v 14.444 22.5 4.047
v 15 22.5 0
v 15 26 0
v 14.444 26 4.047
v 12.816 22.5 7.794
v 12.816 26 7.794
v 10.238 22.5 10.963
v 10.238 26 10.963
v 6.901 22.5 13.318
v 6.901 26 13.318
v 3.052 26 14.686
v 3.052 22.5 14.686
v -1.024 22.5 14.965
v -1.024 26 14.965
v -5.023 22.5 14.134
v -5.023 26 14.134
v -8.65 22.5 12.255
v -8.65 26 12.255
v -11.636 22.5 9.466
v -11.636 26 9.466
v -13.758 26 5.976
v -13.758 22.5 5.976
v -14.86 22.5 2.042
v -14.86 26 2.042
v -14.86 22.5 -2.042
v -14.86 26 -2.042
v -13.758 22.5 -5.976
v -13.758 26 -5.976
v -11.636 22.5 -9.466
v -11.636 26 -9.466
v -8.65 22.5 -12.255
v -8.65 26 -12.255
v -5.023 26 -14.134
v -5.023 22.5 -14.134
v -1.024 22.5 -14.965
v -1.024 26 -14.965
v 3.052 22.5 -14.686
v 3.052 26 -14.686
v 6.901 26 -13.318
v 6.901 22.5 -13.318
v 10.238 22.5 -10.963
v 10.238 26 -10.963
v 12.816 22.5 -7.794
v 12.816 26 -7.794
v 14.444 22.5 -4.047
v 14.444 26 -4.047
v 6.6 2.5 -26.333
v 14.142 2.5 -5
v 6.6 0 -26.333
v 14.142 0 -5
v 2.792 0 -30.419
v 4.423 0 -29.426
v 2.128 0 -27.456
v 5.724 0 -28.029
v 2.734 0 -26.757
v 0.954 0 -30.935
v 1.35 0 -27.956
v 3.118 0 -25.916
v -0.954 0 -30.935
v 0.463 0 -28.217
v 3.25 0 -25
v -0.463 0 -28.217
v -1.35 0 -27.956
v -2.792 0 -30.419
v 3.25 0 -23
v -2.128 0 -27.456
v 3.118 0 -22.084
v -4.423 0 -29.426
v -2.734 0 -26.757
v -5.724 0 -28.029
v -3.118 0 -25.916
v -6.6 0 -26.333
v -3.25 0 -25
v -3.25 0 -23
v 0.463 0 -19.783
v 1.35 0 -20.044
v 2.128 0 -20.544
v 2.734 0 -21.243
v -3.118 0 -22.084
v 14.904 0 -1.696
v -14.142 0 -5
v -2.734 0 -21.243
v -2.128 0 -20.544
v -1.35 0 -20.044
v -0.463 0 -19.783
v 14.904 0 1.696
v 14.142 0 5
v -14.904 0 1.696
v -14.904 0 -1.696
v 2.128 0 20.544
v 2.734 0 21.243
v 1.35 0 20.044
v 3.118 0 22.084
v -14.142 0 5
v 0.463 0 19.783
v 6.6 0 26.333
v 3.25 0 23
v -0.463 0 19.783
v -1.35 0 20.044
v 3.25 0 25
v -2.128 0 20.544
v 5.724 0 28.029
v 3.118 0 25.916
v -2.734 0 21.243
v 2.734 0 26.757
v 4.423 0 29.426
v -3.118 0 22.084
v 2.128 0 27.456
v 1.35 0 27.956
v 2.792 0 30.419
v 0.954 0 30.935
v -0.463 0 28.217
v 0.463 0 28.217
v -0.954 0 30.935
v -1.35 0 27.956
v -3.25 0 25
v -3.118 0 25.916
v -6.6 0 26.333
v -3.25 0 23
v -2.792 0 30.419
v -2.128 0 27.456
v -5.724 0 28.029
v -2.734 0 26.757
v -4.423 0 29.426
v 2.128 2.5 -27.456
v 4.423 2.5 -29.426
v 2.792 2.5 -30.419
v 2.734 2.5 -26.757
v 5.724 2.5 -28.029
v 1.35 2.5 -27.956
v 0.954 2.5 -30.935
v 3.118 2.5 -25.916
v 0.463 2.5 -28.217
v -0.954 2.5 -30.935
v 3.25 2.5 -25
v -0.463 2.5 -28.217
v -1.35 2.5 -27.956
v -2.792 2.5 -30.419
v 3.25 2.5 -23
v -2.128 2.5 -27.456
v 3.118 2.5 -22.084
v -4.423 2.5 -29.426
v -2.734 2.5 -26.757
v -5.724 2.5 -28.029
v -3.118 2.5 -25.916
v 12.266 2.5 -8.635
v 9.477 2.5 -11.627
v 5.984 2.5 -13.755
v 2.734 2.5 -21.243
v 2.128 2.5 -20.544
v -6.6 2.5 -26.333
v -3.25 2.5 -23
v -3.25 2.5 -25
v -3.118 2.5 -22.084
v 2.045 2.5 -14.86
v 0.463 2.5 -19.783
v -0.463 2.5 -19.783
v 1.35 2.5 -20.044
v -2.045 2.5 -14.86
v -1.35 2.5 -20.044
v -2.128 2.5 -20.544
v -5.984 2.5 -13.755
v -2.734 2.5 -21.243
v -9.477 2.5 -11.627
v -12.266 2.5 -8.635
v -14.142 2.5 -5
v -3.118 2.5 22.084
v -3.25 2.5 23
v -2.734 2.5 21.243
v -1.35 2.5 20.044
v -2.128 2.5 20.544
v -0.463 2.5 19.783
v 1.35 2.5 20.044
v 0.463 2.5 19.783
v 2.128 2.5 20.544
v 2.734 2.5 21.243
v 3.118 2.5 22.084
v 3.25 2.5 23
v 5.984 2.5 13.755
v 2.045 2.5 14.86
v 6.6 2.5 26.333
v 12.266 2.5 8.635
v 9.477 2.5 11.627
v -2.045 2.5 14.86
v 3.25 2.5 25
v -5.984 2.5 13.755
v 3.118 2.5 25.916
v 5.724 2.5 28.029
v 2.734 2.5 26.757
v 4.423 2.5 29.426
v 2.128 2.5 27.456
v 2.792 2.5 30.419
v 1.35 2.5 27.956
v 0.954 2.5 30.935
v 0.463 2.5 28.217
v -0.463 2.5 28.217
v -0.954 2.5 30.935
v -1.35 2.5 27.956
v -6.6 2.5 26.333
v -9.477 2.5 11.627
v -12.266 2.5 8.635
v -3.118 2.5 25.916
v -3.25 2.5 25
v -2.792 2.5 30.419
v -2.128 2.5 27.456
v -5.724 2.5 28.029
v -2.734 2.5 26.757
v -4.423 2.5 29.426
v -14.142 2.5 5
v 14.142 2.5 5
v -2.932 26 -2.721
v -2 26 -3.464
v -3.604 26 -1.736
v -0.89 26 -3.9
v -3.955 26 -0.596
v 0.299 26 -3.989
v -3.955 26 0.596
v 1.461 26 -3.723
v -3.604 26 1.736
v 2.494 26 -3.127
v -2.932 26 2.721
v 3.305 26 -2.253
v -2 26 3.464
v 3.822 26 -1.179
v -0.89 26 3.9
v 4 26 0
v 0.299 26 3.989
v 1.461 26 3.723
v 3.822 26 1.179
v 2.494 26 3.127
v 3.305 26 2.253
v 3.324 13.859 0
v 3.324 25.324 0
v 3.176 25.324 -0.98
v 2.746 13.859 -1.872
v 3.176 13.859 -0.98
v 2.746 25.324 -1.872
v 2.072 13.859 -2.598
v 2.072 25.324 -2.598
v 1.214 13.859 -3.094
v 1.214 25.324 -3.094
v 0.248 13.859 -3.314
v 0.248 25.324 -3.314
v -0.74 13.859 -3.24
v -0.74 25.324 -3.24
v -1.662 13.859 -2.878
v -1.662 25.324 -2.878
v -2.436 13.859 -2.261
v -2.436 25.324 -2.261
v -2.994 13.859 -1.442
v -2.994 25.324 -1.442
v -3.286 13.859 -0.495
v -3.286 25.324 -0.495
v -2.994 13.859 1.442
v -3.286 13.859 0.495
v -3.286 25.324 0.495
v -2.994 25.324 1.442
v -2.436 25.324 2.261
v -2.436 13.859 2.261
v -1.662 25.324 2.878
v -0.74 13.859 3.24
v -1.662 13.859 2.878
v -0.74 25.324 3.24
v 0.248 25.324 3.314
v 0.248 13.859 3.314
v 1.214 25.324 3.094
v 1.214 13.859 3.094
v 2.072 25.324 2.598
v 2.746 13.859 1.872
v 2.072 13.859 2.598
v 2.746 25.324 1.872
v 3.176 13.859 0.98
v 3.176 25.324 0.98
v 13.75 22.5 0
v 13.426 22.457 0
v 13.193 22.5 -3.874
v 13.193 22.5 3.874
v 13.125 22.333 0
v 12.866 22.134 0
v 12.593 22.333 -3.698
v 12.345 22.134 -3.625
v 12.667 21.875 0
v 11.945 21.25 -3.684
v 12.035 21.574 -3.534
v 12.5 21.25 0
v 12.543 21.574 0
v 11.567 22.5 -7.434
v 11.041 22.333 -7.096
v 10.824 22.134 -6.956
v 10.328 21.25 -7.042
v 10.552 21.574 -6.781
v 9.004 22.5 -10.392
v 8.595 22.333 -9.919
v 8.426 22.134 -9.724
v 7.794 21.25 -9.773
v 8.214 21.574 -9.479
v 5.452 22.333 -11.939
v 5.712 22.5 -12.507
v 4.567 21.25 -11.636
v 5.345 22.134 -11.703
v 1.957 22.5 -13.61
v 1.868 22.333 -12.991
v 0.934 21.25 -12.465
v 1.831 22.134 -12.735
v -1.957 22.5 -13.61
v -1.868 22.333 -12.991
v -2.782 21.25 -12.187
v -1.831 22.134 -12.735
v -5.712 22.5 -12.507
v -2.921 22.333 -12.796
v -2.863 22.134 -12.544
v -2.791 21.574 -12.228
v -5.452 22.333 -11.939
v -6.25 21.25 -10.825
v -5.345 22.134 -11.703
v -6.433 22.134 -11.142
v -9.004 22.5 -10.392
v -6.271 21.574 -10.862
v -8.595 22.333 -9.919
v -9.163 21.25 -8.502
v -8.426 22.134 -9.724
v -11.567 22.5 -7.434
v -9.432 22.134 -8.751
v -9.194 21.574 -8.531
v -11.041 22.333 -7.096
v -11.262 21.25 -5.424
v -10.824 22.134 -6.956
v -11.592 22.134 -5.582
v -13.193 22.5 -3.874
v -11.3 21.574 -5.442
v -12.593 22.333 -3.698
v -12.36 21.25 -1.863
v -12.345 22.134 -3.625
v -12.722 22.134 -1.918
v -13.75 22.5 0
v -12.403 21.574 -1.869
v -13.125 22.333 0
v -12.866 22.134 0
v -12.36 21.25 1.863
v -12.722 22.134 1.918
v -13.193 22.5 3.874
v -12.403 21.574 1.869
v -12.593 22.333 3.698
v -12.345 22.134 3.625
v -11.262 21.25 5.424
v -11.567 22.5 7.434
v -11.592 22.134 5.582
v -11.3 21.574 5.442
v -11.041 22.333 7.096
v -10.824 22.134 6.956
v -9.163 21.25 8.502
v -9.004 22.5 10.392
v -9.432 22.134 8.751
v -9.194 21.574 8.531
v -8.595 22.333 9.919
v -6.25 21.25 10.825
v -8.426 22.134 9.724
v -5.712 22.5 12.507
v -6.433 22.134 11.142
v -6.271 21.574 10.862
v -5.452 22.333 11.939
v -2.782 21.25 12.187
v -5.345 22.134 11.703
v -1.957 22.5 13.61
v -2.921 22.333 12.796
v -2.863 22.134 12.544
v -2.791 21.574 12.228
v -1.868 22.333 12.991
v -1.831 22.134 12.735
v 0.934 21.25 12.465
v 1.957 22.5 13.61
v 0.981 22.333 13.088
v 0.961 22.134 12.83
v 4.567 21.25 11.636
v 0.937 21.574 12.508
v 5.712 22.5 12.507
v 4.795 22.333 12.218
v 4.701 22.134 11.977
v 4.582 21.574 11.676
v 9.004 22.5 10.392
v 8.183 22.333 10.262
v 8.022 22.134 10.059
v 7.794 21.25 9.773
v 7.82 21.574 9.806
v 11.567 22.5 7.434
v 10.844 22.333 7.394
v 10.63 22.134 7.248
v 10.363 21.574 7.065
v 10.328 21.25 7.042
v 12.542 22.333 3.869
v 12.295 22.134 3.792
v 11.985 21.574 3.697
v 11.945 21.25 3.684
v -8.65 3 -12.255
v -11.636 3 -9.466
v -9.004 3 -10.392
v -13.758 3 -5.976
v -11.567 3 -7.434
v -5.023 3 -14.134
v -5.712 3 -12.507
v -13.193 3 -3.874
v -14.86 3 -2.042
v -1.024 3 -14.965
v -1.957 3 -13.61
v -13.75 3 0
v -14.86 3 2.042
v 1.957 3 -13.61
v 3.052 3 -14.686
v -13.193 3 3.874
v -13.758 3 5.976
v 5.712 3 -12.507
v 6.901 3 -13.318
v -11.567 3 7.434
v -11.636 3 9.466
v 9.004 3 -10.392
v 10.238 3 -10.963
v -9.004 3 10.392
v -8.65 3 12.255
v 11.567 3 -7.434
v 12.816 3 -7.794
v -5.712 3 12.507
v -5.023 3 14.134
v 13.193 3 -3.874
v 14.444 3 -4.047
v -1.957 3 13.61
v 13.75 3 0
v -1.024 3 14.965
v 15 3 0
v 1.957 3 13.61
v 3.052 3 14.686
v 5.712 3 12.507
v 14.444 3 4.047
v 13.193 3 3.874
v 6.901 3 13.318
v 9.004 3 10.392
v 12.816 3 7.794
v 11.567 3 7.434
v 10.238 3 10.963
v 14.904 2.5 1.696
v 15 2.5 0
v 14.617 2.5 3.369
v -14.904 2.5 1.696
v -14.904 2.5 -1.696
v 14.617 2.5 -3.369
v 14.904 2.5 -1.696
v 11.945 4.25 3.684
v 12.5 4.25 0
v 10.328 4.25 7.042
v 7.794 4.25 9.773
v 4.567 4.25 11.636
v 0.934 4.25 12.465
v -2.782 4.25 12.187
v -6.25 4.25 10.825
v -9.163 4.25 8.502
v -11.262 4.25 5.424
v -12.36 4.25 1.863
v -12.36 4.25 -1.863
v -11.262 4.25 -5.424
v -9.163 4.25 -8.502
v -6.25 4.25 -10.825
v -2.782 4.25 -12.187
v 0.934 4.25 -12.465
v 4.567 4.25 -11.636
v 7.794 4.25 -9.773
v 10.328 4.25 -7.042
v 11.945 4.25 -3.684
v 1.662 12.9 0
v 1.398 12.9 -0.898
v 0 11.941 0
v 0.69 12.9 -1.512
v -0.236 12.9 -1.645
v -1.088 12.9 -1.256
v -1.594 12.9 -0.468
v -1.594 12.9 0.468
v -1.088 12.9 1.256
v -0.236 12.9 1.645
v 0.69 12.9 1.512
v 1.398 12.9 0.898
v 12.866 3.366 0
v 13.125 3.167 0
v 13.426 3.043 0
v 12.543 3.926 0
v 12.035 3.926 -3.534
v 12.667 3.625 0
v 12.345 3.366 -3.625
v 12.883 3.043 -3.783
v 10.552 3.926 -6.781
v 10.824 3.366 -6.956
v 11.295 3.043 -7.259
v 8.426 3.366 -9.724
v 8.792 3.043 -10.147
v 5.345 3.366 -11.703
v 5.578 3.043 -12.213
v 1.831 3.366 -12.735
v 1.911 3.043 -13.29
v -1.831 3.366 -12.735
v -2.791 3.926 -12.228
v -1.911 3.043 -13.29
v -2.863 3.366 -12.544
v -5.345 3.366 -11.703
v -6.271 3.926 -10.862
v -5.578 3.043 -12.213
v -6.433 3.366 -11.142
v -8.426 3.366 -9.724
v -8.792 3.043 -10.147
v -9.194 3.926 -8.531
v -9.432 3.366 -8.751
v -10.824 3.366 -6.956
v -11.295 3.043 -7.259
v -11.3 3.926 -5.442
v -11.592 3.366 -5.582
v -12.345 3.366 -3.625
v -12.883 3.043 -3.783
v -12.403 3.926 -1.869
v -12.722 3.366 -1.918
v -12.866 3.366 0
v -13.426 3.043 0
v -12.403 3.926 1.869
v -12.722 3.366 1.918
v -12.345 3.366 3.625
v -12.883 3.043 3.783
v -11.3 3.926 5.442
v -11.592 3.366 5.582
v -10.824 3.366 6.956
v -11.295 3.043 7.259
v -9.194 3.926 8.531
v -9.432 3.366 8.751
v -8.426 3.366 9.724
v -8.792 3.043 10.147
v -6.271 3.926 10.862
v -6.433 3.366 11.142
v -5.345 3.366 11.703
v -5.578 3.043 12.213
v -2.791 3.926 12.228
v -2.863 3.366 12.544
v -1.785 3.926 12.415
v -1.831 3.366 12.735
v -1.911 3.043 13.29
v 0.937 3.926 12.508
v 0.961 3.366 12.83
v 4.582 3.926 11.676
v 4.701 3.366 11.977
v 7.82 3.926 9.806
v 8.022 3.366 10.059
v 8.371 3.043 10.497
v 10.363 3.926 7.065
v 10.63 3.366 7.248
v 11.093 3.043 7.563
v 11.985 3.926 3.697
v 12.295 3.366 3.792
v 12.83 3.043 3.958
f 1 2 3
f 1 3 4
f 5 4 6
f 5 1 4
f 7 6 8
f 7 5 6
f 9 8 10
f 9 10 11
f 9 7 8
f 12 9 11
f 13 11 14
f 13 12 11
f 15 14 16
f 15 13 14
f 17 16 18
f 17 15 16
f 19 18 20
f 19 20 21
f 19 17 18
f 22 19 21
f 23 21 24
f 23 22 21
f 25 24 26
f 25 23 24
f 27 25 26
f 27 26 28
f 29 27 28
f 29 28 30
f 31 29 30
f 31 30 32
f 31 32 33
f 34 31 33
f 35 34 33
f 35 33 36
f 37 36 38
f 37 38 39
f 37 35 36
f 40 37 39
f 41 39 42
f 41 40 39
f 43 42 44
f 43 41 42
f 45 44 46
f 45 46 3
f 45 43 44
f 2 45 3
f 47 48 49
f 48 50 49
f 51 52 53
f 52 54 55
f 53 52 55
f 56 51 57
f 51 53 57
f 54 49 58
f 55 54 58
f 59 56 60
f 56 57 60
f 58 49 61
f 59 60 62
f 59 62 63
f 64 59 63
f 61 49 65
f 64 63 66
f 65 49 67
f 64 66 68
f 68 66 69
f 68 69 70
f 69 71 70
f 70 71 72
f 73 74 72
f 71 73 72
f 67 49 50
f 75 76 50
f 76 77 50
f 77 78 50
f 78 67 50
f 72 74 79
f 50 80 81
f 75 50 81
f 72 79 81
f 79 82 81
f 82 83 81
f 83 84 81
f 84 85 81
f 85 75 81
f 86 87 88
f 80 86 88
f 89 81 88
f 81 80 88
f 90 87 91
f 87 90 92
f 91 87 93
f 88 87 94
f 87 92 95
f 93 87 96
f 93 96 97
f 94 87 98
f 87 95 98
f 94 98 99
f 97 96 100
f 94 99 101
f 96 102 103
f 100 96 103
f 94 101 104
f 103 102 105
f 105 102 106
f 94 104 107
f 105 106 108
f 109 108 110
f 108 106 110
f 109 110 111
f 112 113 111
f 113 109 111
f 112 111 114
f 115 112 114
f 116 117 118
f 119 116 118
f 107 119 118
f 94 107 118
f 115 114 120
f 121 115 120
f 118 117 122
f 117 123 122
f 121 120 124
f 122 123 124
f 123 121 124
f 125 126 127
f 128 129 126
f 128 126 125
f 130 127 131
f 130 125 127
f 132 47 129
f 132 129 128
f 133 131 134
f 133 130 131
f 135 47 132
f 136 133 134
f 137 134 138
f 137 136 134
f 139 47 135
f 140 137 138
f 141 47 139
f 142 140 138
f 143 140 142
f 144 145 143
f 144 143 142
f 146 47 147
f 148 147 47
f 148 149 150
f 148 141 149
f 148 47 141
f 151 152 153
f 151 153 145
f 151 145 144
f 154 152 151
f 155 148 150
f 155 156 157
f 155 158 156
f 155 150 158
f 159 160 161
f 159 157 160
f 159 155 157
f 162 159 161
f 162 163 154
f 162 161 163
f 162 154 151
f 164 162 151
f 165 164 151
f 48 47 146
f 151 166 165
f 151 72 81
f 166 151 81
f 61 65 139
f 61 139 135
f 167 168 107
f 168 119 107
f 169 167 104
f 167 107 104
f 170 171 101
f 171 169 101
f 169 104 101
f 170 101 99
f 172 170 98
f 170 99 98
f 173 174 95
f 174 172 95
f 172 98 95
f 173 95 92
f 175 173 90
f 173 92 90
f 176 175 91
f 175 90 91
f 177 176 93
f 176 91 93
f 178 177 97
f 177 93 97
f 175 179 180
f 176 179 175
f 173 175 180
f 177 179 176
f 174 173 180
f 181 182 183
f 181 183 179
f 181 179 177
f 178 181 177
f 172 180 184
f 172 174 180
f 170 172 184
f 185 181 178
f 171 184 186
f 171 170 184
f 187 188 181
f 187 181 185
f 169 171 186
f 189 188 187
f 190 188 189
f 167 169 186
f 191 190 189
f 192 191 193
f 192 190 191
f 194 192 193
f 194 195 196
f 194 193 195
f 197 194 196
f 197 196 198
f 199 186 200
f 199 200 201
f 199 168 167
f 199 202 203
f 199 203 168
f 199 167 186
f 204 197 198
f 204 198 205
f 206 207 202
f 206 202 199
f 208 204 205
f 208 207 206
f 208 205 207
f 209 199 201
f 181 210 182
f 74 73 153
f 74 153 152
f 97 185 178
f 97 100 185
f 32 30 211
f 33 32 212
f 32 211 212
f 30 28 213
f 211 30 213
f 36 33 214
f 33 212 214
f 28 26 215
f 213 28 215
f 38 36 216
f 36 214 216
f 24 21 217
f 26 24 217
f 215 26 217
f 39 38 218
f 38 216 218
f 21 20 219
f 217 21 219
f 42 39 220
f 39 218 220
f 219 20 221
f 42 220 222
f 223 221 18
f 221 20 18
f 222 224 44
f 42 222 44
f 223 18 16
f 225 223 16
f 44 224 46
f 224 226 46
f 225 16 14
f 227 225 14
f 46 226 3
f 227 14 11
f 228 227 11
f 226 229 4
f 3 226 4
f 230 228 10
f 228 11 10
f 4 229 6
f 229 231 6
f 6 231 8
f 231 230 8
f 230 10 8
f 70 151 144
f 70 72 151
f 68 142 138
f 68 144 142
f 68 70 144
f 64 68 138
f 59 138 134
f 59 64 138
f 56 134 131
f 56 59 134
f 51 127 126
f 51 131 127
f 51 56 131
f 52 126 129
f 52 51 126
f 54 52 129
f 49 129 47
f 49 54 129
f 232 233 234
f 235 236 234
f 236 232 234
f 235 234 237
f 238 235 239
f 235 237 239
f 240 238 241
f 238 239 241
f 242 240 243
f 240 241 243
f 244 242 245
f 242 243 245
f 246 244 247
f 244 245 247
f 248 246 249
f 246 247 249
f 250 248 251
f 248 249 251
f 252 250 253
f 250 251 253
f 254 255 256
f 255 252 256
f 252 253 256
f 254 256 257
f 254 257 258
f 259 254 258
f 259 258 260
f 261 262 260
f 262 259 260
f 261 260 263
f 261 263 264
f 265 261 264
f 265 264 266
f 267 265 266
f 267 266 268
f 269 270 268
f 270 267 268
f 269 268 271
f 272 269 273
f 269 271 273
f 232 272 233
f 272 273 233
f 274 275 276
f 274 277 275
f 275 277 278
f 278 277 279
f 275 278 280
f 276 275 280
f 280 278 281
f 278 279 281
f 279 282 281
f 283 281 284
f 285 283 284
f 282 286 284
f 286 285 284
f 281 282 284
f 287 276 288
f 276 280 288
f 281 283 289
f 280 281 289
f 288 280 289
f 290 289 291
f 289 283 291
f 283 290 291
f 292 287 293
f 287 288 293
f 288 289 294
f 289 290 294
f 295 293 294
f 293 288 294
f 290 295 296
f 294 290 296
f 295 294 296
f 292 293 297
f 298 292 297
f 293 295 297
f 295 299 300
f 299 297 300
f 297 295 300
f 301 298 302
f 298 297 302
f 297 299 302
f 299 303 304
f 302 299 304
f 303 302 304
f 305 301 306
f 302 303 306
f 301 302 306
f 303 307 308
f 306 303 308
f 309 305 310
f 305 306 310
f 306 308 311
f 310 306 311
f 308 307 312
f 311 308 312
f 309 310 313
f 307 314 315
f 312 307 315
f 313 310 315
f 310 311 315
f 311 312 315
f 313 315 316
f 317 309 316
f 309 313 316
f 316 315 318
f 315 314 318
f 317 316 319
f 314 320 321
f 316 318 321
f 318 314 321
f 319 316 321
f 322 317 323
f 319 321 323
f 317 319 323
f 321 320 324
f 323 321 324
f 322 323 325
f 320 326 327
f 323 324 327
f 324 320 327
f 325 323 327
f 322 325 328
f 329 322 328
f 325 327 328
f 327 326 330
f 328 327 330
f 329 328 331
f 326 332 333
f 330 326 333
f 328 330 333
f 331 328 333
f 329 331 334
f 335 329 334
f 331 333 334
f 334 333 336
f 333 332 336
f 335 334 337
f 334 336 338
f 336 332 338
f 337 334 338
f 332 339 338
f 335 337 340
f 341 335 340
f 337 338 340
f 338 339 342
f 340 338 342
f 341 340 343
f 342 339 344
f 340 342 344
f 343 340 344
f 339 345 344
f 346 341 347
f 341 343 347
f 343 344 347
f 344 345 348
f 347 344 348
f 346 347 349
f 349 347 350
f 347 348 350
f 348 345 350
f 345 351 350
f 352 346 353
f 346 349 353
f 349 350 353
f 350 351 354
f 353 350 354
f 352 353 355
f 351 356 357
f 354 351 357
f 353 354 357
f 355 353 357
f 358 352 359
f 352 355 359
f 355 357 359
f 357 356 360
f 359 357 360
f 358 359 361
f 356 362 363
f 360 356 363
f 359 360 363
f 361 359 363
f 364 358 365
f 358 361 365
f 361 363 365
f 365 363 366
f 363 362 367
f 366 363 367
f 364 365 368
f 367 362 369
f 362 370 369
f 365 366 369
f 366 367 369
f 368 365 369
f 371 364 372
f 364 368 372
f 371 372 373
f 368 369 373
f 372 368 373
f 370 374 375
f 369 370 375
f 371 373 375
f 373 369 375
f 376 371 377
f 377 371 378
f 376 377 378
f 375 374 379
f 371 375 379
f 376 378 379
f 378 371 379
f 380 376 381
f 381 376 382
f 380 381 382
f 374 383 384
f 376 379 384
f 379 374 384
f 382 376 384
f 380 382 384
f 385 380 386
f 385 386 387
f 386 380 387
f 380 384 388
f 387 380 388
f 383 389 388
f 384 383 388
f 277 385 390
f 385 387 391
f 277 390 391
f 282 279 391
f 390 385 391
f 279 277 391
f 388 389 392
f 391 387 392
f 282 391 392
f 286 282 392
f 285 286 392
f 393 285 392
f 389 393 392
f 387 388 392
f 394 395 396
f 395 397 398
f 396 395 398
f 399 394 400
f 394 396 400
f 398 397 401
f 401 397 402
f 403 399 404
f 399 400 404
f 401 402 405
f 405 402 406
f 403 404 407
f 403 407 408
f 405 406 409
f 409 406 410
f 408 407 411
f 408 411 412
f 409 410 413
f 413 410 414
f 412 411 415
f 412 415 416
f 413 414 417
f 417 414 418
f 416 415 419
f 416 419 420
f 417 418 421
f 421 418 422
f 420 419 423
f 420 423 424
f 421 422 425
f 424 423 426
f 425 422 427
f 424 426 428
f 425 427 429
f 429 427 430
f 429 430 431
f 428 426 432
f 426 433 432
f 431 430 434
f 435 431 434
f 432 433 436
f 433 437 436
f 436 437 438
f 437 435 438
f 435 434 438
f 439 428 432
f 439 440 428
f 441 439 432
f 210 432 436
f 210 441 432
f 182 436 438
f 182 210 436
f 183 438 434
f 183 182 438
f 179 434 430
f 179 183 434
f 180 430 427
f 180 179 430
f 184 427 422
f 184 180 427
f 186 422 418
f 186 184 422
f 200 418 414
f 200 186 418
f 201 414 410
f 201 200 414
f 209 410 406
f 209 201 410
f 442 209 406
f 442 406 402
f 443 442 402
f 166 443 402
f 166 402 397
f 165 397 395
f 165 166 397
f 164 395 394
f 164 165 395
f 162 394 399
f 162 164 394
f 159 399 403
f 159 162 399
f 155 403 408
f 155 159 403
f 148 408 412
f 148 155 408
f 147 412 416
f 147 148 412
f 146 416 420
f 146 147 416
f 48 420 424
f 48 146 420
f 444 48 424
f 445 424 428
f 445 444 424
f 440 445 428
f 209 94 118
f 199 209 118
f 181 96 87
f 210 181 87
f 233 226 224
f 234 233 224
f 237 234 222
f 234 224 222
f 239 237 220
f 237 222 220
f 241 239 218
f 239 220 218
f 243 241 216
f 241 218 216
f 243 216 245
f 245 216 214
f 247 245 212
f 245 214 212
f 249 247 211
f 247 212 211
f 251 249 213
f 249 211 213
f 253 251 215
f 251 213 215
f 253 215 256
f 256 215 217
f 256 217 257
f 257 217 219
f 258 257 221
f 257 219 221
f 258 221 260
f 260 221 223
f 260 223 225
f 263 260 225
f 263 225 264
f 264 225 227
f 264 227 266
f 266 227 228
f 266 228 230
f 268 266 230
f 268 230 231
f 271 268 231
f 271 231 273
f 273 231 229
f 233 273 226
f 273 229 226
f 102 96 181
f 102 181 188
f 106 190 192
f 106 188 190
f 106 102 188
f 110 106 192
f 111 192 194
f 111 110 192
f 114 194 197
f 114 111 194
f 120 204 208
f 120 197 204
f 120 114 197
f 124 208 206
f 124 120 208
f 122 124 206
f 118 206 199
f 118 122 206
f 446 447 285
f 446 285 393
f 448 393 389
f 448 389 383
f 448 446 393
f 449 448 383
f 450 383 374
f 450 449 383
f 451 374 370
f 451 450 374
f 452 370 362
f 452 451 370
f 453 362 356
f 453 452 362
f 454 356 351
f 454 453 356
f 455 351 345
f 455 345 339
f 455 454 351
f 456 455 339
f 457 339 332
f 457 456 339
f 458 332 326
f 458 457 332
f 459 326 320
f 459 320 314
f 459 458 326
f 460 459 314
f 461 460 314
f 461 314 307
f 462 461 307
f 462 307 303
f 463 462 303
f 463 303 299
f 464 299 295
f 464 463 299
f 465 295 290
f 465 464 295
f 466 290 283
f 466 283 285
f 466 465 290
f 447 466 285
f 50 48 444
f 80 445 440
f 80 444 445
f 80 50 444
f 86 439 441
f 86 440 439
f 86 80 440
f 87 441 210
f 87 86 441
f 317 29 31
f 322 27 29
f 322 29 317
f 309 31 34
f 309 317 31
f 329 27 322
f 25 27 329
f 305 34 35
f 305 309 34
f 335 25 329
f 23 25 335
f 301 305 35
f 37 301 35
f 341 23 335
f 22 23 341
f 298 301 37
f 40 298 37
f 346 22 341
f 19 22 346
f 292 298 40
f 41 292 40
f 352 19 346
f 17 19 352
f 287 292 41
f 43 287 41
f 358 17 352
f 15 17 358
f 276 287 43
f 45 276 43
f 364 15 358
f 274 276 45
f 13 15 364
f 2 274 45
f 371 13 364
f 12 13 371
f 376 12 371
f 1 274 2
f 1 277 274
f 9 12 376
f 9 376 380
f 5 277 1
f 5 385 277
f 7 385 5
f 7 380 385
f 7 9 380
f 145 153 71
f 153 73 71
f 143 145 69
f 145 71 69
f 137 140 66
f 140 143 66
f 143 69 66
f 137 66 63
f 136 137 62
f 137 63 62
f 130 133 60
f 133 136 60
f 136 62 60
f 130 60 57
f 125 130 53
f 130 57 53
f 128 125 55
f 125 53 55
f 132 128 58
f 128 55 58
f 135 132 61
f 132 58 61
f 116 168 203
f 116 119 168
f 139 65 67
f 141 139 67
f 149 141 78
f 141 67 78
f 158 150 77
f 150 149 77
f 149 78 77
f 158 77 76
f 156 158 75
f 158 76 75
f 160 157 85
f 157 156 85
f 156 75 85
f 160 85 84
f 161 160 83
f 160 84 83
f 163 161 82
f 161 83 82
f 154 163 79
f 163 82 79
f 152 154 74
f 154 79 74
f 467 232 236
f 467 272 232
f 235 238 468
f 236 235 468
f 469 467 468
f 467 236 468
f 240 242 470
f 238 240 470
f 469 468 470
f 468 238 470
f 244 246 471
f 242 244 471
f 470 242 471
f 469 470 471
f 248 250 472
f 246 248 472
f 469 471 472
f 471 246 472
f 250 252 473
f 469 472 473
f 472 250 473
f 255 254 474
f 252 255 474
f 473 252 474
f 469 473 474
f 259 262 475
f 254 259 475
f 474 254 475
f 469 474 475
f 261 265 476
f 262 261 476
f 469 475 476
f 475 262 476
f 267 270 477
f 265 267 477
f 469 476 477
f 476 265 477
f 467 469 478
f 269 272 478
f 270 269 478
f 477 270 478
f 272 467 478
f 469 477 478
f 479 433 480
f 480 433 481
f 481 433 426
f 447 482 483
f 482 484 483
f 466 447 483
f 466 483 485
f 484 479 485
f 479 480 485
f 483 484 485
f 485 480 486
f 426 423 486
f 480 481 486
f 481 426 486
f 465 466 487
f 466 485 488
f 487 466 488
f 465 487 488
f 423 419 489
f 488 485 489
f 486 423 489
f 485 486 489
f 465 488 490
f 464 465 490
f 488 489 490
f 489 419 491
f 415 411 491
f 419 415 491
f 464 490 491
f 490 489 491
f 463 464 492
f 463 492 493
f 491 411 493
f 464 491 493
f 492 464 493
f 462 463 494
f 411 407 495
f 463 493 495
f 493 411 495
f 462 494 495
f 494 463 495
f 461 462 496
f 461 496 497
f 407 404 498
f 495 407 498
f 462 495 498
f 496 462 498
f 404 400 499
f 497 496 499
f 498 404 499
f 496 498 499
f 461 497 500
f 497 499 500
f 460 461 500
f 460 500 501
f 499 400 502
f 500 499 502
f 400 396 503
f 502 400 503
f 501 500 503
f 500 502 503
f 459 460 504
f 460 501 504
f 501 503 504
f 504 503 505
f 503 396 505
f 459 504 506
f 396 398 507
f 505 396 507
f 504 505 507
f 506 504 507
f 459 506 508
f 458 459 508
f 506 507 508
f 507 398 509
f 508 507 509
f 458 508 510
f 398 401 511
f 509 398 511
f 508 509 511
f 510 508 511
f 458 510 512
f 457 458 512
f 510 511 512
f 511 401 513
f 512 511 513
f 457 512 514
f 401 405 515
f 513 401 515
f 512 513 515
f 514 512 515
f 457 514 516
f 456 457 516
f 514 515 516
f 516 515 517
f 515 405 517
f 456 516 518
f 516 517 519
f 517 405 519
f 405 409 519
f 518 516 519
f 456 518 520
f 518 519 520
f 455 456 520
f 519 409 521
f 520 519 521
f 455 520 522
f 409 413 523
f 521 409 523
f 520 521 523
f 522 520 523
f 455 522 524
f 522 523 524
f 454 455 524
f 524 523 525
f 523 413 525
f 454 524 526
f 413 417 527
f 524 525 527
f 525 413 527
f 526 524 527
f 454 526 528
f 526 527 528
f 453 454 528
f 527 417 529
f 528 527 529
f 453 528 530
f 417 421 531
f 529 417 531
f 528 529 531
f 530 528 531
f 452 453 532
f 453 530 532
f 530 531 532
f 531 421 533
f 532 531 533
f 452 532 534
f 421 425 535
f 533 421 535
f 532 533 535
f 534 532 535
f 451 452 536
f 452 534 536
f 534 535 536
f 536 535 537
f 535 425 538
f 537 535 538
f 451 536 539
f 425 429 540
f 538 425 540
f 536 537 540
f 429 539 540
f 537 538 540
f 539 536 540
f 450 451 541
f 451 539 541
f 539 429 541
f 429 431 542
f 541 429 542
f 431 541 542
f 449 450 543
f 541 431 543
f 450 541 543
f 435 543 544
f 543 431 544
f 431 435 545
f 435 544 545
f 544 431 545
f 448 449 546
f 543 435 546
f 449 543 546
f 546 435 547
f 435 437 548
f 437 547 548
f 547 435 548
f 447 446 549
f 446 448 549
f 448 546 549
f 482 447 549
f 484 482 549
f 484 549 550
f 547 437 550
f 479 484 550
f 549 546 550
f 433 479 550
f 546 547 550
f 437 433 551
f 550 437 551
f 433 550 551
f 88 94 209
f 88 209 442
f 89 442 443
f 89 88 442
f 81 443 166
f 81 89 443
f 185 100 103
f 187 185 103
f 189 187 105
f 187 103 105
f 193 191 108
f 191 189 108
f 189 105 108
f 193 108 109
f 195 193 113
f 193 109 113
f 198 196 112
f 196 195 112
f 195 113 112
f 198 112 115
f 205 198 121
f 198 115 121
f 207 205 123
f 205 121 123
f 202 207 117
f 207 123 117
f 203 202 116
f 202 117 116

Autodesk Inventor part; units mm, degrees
ref_plane "XZ Plane" through (0, 0, 0) normal (0, 1, 0) x (-1, 0, 0)
sketch "__1" plane through (0, 0, 0) normal (0, 1, 0) x (-1, 0, 0)
  arc A0 (14.1421, -5) -> (14.1421, 5) centre (0, 0) ccw
  line L0 (14.1421, 5) -> (6.5997, 26.3333)
  arc A1 (6.5997, 26.3333) -> (-6.5997, 26.3333) centre (0, 24) ccw
  line L1 (-6.5997, 26.3333) -> (-14.1421, 5)
  arc A2 (-14.1421, 5) -> (-14.1421, -5) centre (0, 0) ccw
  line L2 (-14.1421, -5) -> (-6.5997, -26.3333)
  arc A3 (-6.5997, -26.3333) -> (6.5997, -26.3333) centre (0, -24) ccw
  line L3 (6.5997, -26.3333) -> (14.1421, -5)
  arc A4 (3.25, -23) -> (-3.25, -23) centre (0, -23) ccw
  line L4 (-3.25, -23) -> (-3.25, -25)
  arc A5 (-3.25, -25) -> (3.25, -25) centre (0, -25) ccw
  line L5 (3.25, -25) -> (3.25, -23)
  line L6 (3.25, 23) -> (3.25, 25)
  arc A6 (3.25, 25) -> (-3.25, 25) centre (0, 25) ccw
  line L7 (-3.25, 25) -> (-3.25, 23)
  arc A7 (-3.25, 23) -> (3.25, 23) centre (0, 23) ccw
extrude "Extrusion1" add sketch "__1" along normal blind 2.5
sketch "__2" plane through (0, 0, 0) normal (0, 0, 1) x (1, 0, 0)
  line L0 (0, 2.5) -> (0, 26)
  line L1 (0, 11.9406) -> (3.3235, 13.8594)
  line L2 (3.3235, 13.8594) -> (3.3235, 25.3235)
  line L3 (3.3235, 25.3235) -> (4, 26)
  line L4 (4, 26) -> (15, 26)
  line L5 (15, 26) -> (15, 22.5)
  line L6 (15, 22.5) -> (13.75, 22.5)
  arc A0 (13.75, 22.5) -> (12.5, 21.25) centre (13.75, 21.25) ccw
  line L7 (12.5, 21.25) -> (12.5, 4.25)
  arc A1 (12.5, 4.25) -> (13.75, 3) centre (13.75, 4.25) ccw
  line L8 (13.75, 3) -> (15, 3)
  line L9 (15, 3) -> (15, 2.5)
  line L10 (15, 2.5) -> (0, 2.5)
  line L11 (0, 2.5) -> (0, 11.9406)
revolve "Revolution1" add sketch "__2" angle 360 about axis through (0, 2.5, 0) along (0, -1, 0)
thread "Thread1" size "M8x1.25" class "6H" standard "ISO Metric profile" length 7.3235
ref_plane "Arbeitsebene1" through (0, 0, 24) normal (0, 0, 1) x (1, 0, 0)
ref_plane "Arbeitsebene2" through (0, 0, -24) normal (0, 0, 1) x (1, 0, 0)
properties part number "NHF19-3026-M8"
